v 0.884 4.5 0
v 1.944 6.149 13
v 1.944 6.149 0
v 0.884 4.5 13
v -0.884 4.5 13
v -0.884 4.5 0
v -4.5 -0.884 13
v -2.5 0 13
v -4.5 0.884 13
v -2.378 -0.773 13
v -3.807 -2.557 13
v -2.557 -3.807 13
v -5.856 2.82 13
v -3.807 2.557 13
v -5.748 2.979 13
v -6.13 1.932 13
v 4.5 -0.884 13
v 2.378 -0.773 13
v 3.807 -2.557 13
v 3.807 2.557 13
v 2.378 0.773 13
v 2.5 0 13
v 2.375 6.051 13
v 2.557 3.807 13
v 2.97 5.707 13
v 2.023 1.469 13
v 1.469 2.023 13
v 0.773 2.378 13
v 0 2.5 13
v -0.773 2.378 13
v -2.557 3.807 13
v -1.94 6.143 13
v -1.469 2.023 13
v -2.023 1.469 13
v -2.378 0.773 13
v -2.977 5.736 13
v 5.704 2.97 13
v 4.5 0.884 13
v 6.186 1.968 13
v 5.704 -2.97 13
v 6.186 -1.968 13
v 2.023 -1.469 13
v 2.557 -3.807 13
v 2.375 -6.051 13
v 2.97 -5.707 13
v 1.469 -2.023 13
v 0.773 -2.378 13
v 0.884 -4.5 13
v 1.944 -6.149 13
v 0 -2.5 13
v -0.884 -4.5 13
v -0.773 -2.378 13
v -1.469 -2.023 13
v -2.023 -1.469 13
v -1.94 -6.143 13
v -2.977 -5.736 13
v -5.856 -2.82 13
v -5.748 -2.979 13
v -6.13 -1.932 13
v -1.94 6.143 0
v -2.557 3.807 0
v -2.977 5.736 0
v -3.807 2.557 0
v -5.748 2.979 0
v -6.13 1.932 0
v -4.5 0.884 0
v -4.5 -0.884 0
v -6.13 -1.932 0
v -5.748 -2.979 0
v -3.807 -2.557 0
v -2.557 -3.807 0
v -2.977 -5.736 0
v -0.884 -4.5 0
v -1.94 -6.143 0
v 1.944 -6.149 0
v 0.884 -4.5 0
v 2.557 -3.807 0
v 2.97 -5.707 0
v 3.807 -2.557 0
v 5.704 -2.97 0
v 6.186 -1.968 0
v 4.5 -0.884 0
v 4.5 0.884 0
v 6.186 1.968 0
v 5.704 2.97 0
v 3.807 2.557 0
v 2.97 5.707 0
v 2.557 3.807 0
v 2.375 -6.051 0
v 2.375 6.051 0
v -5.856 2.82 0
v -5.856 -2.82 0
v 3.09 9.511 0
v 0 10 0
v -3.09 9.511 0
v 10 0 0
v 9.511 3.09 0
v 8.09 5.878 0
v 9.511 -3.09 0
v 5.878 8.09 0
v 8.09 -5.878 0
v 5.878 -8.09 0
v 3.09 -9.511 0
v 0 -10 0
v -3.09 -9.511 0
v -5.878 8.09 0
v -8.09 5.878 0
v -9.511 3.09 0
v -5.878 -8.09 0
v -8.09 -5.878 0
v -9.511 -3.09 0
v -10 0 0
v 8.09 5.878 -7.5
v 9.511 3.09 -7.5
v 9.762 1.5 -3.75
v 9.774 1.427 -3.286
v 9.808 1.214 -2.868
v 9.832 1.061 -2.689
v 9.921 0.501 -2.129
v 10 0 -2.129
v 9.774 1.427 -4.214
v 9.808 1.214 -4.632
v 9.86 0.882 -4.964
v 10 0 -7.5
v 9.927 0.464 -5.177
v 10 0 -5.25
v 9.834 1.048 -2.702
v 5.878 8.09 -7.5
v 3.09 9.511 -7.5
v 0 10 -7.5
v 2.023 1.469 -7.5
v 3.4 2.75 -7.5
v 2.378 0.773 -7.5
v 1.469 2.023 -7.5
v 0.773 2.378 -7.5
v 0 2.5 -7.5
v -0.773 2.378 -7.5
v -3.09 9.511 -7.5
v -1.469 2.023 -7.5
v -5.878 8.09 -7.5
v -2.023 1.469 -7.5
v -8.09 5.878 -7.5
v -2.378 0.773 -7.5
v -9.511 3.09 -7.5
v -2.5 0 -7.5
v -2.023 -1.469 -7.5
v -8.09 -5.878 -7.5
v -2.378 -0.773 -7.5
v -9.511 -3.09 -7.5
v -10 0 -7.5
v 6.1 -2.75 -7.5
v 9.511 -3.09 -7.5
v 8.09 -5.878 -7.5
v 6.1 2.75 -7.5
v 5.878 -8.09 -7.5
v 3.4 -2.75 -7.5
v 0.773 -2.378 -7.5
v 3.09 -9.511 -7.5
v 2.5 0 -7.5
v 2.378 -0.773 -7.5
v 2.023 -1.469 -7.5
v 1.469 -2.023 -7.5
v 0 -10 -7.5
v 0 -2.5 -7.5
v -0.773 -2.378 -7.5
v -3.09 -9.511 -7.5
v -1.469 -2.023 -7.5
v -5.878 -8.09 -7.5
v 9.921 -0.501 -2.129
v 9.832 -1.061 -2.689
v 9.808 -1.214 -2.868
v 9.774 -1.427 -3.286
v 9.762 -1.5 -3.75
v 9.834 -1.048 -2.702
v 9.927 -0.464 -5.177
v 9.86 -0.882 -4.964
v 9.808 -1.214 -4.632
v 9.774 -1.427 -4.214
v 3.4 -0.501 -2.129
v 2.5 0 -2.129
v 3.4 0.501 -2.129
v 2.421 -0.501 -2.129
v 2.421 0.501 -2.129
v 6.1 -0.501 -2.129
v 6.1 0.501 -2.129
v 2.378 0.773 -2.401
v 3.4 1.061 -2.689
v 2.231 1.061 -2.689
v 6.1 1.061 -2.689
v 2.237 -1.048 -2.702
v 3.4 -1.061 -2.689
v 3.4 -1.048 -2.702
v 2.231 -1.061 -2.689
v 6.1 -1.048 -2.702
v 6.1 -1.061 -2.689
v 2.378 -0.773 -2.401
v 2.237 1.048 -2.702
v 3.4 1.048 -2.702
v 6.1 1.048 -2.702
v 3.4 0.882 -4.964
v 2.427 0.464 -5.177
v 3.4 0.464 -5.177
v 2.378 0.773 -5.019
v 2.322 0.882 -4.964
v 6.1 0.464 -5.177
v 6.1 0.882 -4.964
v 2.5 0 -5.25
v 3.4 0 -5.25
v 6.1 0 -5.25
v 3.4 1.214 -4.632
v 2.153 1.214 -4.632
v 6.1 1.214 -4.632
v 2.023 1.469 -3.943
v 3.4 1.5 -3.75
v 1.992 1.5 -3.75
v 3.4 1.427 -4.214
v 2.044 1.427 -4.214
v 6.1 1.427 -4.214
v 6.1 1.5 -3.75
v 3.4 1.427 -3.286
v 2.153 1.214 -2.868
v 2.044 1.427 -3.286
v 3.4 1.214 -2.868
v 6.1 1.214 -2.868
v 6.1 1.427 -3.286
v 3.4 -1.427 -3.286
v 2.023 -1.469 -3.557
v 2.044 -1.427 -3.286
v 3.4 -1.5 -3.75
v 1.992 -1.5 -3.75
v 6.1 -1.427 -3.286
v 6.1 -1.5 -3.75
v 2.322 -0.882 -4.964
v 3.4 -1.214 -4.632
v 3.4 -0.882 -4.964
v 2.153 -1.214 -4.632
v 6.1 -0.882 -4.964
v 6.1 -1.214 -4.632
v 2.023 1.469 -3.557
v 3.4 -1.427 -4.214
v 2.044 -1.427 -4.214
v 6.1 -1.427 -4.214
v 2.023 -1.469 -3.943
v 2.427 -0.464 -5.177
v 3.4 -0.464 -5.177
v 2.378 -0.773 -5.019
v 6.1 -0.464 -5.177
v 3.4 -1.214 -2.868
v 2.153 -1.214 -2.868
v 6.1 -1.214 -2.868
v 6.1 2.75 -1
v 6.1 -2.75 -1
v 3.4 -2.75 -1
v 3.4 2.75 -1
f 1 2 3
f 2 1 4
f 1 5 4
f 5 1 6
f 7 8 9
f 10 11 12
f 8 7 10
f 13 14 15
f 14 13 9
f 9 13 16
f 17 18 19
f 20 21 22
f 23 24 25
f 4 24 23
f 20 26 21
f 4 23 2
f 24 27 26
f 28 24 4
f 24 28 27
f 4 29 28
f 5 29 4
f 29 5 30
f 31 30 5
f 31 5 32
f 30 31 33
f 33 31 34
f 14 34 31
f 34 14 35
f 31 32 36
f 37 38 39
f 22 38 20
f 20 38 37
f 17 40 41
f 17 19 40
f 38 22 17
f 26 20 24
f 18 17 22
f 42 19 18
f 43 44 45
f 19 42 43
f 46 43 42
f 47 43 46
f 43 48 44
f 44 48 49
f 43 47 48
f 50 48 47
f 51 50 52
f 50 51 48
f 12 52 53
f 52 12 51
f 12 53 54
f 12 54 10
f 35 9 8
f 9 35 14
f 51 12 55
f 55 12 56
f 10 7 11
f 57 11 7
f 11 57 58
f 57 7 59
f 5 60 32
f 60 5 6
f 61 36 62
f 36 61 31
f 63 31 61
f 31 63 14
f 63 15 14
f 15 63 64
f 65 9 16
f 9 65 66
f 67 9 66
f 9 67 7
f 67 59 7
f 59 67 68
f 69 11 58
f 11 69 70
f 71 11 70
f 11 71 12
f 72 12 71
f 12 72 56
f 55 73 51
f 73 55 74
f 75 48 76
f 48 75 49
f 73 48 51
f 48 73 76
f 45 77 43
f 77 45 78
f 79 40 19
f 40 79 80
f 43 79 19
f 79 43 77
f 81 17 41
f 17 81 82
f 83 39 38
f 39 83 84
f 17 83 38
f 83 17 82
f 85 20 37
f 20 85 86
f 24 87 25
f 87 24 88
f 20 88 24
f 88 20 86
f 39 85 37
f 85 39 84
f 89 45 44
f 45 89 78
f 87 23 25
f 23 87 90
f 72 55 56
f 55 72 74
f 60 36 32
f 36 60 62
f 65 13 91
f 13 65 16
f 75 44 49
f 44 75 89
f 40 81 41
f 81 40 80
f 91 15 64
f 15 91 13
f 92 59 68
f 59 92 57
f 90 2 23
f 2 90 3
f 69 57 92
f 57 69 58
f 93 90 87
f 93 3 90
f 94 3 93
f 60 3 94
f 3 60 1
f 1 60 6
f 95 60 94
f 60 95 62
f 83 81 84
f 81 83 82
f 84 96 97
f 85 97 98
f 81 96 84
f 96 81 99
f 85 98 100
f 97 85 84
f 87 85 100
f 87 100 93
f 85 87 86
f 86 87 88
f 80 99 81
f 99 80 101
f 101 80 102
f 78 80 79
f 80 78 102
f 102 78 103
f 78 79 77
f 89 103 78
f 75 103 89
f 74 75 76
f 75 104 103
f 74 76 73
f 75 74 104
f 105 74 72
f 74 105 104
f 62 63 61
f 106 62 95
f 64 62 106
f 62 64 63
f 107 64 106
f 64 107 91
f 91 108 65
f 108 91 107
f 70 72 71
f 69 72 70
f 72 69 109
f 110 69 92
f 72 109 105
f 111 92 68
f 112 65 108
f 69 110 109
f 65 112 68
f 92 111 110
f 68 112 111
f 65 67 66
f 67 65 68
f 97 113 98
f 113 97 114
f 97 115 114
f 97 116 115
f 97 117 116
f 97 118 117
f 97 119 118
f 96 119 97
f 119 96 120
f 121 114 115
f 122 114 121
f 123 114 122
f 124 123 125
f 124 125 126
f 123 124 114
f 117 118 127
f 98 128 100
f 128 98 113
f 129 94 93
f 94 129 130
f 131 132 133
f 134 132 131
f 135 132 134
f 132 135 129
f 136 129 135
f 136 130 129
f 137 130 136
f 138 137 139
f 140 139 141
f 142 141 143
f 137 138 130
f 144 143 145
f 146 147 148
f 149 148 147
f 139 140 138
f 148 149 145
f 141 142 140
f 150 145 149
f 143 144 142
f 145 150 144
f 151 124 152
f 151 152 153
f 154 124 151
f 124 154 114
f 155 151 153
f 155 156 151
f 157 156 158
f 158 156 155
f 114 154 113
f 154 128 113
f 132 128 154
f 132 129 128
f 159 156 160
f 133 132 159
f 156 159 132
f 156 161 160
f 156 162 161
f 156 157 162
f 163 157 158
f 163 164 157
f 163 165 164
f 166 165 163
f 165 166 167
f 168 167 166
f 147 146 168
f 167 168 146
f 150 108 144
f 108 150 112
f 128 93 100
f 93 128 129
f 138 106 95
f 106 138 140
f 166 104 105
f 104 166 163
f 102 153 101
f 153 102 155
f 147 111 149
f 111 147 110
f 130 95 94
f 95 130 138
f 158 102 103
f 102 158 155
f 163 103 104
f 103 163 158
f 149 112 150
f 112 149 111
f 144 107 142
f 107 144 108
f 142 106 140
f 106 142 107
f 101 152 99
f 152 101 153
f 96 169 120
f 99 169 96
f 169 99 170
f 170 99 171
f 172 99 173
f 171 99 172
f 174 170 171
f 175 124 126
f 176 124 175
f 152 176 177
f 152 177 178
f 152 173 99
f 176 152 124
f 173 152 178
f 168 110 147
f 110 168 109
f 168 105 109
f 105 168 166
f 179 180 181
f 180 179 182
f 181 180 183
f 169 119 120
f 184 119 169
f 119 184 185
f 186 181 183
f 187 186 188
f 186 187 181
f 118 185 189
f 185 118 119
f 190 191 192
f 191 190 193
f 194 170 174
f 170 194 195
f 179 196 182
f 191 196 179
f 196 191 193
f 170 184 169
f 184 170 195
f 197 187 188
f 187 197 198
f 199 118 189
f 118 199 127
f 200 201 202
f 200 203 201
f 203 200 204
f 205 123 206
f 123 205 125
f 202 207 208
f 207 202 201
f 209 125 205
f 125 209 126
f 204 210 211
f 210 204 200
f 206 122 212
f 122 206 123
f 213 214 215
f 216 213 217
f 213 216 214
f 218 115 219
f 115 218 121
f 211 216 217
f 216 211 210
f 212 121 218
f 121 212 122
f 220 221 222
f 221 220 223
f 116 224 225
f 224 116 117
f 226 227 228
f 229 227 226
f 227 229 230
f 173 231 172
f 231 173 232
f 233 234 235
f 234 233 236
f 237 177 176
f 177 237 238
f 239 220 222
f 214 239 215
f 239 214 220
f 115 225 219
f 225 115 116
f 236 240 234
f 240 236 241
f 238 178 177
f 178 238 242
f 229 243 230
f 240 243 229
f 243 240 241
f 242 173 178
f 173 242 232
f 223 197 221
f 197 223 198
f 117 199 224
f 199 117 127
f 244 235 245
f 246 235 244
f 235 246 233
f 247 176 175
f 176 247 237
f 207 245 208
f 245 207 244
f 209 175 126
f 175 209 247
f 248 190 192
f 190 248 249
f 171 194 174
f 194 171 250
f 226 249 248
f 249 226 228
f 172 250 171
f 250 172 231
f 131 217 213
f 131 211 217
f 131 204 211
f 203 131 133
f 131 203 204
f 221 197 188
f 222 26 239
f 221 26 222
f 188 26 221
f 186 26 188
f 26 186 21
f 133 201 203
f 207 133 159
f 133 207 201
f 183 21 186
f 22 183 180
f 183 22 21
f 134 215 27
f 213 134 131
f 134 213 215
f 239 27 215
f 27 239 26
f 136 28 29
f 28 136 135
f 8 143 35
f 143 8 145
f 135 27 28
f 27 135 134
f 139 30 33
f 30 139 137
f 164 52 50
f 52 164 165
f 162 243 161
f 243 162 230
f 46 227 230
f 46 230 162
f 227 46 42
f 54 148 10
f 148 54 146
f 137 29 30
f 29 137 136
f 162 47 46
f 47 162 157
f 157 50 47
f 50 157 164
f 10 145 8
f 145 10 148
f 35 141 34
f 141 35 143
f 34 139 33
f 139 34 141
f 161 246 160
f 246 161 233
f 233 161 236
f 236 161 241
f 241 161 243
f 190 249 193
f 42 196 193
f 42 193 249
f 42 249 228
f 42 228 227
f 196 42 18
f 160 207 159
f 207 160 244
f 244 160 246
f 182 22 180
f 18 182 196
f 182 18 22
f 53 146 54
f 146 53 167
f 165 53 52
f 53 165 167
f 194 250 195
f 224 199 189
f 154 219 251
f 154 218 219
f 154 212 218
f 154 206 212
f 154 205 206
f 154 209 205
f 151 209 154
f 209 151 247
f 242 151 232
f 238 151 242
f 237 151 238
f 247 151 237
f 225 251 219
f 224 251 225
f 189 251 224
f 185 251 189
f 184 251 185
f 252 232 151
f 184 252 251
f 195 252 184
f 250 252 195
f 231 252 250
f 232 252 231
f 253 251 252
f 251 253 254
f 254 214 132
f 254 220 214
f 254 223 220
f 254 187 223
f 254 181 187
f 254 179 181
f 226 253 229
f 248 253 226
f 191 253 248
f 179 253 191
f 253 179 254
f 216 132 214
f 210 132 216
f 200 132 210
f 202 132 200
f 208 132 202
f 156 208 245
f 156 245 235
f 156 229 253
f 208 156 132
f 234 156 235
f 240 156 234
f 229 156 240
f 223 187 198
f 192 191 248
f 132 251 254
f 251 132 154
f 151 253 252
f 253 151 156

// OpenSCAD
pi=3.14159265;

// Make a RepRap teardrop with its axis along Z
// If truncated is true, chop the apex; if not, come to a point

// I stole this function from Erik...


module teardrop(r=1.5, h=20, truncateMM=0.5)
{
	union()
	{
		if(truncateMM > 0)
		{
			intersection()
			{
				translate([truncateMM,0,h/2]) 
					scale([1,1,h])
						cube([r*2.8275,r*2,1],center=true);
				scale([1,1,h]) 
						rotate([0,0,3*45])
							cube([r,r,1]);
			}
		} else
		{
			scale([1,1,h])
				rotate([0,0,3*45])
					cube([r,r,1]);
		}
		cylinder(r=r, h = h, $fn=20);
	}
}

module tooth_gap(height = 10, number_of_teeth = 11, inner_radius = 10, dr = 3,  angle=7)
{
	linear_extrude(height = 2*height, center = true, convexity = 10, twist = 0)
		polygon( points = [
			[pi*inner_radius/(2*number_of_teeth), 0],
			[-pi*inner_radius/(2*number_of_teeth), 0],
			[-2*dr *sin(angle) - pi*inner_radius/(2*number_of_teeth), 2*dr],
			[2*dr *sin(angle) + pi*inner_radius/(2*number_of_teeth), 2*dr],
		], convexity = 3);
}



module gear(height = 10, number_of_teeth = 11, inner_radius = 10, outer_radius = 12, angle=15)
{
	difference()
	{
		cylinder(h = height, r = outer_radius, centre = true);
		for(i = [0:number_of_teeth])
		{
		rotate([0, 0, i*360/number_of_teeth])
			translate([0, inner_radius, 0])
				tooth_gap(height = height, number_of_teeth = number_of_teeth, inner_radius = inner_radius, 
					dr =  outer_radius - inner_radius,  angle=angle);
		}
	}
}

// This is the actual pulley

difference()
{
	union()
	{
		translate([0,0,0])
			gear(height =13, number_of_teeth = 8, inner_radius = 4.5, outer_radius = 6.5, angle=40);
		translate([0,0,-3.75])
			cylinder(h = 7.5, r = 10,center=true,$fn=20);
	}
	
	cylinder(h = 30, r = 2.5,center=true,$fn=20);
	
	translate([4.75,0,-6])
		cube([2.7,5.5,10], center=true);
	translate([0,0,-3.75])
		rotate([0,90,0])
			teardrop(h = 20, r = 1.5,truncateMM=0.5);
}
